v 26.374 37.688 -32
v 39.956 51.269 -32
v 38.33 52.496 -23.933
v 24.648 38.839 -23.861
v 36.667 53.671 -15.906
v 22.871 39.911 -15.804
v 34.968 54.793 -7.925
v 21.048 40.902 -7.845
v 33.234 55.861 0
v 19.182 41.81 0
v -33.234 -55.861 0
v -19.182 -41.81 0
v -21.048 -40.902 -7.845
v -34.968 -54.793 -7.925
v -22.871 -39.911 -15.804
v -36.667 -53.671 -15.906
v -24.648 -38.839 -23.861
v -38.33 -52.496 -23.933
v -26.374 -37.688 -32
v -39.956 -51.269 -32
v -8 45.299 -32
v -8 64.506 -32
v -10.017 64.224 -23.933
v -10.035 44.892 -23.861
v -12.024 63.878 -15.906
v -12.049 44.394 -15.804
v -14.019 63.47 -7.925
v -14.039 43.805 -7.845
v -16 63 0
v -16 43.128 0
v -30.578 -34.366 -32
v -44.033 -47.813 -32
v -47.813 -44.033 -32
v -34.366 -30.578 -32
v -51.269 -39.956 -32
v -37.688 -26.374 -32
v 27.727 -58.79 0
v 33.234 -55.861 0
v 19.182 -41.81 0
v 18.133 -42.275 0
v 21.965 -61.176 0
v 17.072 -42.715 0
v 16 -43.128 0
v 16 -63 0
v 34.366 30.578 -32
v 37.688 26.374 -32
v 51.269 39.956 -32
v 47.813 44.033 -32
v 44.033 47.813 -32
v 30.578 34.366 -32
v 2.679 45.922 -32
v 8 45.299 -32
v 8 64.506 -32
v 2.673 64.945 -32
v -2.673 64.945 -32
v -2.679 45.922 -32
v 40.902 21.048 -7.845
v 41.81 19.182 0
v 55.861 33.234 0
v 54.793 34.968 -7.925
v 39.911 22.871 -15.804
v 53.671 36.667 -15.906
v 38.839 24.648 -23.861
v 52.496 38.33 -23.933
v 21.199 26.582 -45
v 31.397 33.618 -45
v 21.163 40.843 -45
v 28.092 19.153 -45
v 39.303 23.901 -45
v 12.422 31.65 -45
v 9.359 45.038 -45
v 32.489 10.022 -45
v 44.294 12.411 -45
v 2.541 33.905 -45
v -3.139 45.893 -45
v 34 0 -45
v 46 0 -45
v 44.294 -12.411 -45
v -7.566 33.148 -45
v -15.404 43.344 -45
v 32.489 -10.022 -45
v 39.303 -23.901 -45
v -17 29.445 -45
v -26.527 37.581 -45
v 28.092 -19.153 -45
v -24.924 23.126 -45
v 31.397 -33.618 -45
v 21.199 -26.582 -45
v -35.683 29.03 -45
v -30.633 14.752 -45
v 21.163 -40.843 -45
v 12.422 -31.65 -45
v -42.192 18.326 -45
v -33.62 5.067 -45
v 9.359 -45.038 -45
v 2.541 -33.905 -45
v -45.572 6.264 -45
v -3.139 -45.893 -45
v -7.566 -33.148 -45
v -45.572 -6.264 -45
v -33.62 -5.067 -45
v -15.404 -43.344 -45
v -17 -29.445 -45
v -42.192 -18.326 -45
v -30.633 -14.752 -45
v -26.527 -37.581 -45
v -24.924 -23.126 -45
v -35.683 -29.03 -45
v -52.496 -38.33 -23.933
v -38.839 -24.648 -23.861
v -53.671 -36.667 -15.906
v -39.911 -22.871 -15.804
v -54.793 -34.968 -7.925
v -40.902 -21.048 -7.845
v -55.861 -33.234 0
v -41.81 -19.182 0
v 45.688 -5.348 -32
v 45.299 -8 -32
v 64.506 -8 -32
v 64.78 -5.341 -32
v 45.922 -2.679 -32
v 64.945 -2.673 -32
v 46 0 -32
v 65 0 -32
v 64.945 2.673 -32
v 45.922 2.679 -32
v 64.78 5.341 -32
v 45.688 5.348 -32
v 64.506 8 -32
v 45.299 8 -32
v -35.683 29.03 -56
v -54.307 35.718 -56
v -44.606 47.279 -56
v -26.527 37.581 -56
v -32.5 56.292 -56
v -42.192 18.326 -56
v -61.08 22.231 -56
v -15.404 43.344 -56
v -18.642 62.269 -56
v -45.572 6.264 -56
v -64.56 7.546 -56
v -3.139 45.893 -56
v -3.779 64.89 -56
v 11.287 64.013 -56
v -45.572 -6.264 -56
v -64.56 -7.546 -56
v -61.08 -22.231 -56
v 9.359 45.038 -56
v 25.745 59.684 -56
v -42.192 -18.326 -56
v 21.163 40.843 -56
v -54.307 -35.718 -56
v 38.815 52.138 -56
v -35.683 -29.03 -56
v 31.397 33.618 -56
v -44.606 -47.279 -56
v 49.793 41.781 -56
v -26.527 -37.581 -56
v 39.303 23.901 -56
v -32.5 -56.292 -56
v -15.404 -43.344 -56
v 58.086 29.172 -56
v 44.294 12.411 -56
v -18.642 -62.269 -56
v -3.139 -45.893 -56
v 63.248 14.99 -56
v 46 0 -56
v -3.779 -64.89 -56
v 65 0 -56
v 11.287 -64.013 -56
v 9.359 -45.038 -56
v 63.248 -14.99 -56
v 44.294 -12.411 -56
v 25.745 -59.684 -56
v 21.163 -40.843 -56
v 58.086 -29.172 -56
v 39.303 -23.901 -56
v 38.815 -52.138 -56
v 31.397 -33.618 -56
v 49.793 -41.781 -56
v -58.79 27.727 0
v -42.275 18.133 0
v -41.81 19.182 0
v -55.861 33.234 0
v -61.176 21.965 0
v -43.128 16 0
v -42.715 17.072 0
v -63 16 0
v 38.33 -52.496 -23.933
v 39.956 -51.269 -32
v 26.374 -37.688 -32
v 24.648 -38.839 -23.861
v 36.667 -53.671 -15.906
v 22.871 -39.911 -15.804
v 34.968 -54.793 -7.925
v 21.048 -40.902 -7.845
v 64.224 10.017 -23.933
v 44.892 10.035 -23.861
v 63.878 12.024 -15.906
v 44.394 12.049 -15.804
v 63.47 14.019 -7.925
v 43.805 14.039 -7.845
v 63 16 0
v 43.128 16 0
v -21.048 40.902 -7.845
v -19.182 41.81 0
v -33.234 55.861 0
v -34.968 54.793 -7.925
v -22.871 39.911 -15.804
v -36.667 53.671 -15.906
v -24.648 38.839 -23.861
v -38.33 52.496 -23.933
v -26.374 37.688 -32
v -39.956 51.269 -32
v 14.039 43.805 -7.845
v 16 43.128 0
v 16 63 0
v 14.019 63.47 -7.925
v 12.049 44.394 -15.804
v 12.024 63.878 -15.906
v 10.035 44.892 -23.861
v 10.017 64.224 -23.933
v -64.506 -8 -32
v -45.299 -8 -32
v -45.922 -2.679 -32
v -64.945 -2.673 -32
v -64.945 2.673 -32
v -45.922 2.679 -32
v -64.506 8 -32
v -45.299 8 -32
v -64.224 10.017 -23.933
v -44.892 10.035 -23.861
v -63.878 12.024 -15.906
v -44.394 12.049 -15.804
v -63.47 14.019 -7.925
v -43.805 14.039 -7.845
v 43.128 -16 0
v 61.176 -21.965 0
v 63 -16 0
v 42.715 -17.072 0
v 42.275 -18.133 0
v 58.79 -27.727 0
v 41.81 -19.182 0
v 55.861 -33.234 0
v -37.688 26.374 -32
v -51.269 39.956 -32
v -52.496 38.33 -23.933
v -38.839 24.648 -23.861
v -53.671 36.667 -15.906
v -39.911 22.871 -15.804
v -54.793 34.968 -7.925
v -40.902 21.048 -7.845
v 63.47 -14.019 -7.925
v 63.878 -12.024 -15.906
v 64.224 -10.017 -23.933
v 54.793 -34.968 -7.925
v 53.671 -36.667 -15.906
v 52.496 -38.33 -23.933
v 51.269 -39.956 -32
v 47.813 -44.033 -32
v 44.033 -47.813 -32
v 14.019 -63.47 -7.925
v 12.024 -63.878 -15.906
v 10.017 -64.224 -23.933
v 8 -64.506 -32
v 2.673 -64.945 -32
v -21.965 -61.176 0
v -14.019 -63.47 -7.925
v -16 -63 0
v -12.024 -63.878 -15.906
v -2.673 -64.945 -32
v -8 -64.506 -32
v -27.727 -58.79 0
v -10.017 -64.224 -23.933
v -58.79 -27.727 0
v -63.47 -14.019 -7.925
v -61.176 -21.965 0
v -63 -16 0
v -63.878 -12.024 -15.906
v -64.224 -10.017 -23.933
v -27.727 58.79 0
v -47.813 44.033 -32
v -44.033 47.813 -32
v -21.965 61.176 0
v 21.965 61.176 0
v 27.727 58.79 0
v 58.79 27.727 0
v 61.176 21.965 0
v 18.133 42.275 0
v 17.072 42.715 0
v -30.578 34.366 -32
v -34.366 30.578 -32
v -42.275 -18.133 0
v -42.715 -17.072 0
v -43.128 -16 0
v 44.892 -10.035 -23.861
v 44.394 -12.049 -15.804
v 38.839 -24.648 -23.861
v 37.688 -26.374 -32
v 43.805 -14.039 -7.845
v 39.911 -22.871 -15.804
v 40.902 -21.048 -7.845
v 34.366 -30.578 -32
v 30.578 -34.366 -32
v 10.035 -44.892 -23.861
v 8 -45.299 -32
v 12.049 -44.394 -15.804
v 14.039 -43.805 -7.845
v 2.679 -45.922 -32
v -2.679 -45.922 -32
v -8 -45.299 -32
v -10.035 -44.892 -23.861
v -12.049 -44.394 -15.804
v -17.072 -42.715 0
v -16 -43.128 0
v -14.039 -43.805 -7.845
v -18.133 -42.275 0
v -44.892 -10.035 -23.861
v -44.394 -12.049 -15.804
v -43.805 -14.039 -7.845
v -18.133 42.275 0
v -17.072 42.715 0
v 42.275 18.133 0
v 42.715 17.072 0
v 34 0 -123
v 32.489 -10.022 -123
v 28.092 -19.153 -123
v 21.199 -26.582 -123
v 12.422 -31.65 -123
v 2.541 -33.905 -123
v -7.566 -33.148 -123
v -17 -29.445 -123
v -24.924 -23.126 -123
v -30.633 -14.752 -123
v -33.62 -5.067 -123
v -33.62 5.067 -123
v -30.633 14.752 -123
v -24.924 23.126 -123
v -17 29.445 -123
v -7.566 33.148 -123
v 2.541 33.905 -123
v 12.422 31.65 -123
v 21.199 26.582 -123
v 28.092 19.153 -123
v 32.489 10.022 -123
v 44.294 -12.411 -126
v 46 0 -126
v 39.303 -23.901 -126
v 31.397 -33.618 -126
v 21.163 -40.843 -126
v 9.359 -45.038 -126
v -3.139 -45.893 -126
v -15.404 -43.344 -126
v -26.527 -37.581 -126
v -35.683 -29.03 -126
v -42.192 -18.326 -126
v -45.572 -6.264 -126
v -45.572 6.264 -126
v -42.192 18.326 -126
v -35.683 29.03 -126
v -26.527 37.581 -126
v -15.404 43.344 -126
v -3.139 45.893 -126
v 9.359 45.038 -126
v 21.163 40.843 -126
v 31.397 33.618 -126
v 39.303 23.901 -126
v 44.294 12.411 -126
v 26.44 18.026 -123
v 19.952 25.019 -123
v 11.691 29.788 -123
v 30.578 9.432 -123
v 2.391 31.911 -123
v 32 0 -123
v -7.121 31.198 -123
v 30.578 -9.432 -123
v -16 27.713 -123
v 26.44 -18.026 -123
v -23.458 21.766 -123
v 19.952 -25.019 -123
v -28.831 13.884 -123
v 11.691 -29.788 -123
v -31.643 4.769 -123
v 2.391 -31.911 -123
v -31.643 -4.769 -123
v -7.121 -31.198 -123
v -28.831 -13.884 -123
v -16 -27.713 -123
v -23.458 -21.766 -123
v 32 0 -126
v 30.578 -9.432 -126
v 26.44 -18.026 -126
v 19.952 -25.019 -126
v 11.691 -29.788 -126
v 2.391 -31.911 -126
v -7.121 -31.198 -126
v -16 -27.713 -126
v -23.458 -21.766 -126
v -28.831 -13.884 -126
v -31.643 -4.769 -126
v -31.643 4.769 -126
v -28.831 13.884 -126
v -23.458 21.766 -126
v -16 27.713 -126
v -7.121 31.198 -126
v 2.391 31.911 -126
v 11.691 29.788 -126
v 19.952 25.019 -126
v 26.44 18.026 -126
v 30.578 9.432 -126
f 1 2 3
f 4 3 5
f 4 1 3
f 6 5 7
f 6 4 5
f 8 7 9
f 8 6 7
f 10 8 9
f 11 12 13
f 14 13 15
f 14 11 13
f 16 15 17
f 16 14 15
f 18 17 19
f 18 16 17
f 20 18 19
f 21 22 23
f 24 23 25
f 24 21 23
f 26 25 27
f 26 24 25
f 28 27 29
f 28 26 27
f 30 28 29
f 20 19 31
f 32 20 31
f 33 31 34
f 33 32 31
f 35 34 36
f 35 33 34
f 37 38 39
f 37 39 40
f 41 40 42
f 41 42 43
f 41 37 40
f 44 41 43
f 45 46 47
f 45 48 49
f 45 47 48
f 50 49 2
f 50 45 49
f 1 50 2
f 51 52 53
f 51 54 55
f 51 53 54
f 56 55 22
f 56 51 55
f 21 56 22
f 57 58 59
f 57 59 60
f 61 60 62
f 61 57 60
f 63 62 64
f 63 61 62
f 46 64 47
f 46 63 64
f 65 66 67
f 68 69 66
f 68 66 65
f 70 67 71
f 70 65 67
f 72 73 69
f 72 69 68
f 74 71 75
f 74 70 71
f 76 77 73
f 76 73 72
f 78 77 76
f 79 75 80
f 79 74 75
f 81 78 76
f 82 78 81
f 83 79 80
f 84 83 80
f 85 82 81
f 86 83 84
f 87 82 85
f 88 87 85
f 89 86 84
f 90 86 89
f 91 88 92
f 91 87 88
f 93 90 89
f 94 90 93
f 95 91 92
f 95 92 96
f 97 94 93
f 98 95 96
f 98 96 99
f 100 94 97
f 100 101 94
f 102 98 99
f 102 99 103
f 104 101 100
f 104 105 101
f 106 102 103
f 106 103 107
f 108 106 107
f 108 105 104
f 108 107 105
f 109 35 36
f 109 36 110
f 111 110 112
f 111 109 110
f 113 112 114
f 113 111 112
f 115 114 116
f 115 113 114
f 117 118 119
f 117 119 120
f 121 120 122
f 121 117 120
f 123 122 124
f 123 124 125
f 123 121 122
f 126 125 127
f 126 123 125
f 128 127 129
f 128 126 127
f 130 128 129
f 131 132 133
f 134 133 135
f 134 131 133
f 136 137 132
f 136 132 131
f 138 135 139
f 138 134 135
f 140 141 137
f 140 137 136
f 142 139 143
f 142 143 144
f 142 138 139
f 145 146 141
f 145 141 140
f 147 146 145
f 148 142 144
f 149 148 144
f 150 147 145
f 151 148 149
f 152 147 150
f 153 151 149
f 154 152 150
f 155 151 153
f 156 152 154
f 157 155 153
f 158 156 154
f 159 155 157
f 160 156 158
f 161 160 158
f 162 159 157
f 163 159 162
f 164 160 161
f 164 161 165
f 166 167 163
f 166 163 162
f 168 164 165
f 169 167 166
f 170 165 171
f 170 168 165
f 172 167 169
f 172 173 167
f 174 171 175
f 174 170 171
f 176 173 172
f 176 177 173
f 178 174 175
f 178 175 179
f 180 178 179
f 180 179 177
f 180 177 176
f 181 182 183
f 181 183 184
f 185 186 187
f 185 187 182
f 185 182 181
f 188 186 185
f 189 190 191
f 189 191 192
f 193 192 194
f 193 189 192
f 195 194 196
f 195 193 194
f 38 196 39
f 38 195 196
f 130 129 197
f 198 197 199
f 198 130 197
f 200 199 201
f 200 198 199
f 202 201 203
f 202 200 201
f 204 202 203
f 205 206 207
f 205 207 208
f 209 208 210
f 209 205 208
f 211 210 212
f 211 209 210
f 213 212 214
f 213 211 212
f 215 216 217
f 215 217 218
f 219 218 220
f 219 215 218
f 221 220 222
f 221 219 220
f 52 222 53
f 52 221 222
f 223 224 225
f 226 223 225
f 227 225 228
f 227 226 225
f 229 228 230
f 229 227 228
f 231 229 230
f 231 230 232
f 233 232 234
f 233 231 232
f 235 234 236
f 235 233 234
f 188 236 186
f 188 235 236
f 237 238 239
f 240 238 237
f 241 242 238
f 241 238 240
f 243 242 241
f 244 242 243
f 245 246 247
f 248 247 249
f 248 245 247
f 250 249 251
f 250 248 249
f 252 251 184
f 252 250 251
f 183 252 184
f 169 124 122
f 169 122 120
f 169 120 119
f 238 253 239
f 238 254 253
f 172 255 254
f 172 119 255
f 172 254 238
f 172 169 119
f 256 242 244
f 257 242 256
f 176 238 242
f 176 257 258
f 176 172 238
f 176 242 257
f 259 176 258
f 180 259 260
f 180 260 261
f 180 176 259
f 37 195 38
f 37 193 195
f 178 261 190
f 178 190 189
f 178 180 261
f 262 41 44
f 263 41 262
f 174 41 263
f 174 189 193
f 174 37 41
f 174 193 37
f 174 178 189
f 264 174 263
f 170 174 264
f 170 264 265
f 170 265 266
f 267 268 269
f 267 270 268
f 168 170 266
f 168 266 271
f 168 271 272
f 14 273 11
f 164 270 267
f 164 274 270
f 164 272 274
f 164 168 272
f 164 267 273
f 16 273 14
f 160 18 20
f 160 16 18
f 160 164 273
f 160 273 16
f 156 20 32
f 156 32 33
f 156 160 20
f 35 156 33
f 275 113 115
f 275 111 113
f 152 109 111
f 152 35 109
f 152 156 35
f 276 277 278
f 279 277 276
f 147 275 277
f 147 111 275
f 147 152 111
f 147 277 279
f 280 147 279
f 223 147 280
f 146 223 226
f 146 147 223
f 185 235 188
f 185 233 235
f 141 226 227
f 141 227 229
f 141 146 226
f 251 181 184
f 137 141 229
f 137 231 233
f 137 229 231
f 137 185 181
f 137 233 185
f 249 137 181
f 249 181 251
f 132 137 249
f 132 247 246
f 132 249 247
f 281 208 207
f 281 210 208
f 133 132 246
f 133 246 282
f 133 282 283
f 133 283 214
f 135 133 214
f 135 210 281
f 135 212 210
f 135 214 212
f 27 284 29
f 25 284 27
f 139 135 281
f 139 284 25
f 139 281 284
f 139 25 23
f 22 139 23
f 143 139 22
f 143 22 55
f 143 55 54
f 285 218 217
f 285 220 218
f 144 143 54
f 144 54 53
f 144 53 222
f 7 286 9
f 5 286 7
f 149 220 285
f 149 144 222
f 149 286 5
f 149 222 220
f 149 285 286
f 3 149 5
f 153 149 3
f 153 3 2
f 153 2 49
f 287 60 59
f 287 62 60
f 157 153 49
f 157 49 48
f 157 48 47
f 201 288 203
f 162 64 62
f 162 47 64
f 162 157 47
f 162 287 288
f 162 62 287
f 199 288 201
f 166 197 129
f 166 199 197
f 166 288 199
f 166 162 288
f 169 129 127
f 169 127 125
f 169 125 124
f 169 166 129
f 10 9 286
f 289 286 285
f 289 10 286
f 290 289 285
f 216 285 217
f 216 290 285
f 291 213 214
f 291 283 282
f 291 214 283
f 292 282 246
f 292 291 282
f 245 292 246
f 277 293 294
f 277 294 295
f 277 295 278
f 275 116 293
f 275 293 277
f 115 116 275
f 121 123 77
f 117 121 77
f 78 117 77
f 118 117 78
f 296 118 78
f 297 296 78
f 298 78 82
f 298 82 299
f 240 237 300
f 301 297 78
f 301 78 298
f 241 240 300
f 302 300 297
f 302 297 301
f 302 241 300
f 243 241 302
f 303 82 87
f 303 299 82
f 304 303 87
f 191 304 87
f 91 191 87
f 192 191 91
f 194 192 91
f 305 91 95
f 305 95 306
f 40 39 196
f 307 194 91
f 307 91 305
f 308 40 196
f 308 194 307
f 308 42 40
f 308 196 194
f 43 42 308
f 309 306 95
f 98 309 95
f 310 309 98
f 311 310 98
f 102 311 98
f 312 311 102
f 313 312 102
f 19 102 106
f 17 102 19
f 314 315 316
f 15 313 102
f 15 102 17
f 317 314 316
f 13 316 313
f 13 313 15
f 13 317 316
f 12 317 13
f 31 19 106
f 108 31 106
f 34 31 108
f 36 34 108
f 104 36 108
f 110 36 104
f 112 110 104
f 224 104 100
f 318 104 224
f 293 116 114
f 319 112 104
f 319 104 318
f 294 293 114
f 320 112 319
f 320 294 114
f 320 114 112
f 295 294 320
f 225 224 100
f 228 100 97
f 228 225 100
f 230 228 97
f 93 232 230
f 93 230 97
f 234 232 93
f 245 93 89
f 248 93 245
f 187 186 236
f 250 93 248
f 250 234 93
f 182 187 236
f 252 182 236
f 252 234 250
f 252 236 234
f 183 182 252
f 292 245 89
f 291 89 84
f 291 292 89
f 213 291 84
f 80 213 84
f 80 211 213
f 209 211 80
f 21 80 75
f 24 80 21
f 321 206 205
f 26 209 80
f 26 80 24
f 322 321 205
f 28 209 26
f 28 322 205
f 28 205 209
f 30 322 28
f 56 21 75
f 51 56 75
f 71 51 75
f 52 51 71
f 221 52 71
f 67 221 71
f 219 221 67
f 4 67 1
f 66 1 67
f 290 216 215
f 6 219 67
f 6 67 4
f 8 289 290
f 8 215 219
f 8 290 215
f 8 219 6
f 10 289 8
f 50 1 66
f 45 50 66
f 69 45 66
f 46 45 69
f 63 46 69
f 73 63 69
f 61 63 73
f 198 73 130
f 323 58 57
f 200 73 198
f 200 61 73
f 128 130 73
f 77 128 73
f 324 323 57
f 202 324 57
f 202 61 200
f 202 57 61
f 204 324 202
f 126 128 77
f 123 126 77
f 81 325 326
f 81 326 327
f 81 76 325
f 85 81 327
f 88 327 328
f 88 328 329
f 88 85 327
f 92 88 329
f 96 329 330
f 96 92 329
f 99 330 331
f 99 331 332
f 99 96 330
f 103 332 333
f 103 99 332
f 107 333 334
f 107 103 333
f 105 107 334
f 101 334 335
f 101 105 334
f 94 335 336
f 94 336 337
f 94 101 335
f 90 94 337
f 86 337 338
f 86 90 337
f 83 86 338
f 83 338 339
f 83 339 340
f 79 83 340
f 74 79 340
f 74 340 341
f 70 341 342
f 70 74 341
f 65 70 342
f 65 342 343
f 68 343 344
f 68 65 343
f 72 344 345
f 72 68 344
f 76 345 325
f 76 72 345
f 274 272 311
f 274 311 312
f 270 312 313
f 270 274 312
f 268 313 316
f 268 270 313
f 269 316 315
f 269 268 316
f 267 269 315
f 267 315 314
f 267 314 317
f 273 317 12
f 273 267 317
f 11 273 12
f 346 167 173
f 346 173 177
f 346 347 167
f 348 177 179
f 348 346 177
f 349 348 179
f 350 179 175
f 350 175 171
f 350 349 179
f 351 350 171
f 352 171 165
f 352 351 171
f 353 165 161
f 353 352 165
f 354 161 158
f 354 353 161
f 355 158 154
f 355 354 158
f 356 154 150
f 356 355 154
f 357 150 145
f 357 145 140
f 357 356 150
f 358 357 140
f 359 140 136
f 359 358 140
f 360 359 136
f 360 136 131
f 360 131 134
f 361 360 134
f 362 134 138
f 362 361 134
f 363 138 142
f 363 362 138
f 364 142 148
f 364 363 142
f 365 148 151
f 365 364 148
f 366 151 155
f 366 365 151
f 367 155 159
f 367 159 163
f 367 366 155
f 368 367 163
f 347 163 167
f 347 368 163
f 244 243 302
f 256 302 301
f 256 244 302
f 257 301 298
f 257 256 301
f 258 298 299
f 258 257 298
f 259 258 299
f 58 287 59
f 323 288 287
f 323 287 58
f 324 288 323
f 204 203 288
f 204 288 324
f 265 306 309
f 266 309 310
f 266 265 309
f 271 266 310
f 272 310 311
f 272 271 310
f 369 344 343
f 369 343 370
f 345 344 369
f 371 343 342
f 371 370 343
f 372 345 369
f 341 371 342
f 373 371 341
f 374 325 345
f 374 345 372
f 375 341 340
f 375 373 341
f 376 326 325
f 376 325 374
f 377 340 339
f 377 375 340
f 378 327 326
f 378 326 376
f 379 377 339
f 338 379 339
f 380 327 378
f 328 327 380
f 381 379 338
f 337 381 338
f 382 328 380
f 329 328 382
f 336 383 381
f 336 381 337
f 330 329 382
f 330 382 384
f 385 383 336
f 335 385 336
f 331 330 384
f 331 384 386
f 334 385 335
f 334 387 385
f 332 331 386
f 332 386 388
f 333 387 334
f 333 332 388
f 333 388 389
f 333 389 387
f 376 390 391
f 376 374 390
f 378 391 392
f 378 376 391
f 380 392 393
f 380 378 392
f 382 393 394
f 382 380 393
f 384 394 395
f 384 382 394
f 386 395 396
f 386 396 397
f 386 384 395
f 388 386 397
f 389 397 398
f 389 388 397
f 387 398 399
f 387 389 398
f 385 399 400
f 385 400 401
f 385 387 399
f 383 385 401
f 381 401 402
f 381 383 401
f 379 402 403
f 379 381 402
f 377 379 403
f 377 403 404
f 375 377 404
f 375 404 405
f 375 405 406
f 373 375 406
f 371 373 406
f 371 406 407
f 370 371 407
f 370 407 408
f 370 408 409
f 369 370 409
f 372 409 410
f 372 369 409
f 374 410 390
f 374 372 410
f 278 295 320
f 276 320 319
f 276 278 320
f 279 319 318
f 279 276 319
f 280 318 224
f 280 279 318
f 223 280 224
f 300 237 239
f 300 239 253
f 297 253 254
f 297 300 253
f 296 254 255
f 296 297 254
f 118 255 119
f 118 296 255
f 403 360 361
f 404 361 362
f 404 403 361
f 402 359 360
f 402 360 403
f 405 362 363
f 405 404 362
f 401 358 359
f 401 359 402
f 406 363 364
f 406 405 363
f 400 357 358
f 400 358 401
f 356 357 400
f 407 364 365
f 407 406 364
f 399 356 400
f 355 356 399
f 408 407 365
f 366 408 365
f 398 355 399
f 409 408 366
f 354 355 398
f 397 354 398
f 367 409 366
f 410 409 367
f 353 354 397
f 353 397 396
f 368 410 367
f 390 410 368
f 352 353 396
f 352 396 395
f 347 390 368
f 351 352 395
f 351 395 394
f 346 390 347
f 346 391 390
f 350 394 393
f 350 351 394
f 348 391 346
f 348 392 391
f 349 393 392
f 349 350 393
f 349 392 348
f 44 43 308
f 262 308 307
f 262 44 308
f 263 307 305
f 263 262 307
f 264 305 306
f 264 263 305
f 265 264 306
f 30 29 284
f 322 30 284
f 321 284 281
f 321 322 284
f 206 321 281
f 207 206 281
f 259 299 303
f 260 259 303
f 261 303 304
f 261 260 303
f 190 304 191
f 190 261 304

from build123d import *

# Parameters (mm, degrees)
CUT_EXTRUDE_1_DEPTH      = 65
CUT_EXTRUDE_1_DEPTH_BACK = 65
CUT_EXTRUDE_2_DEPTH      = 65
CUT_EXTRUDE_2_DEPTH_BACK = 65
CUT_EXTRUDE_3_DEPTH      = 65
CUT_EXTRUDE_3_DEPTH_BACK = 65
CUT_EXTRUDE_4_DEPTH      = 65
CUT_EXTRUDE_4_DEPTH_BACK = 65


with BuildPart() as part:
    # Эскиз1 → Повернуть1 (revolve)
    with BuildSketch(Plane(origin=(0, 0, 0), x_dir=(0, 0, -1), z_dir=(1, 0, 0))):
        Polygon((0, 46), (0, 65), (56, 65), (56, 46), (126, 46), (126, 32), (123, 32), (123, 34), (45, 34), (45, 46), align=None)
    revolve(axis=Axis((0, 0, 0), (0, 0, -1)))

    # Эскиз2 → Вытянуть1 (cut, two sides: drawn at the far end of the back side and taken through both)
    with BuildSketch(Plane(origin=(0, 0, 0), x_dir=(0, 0, -1), z_dir=(1, 0, 0)).offset(-CUT_EXTRUDE_1_DEPTH_BACK)):
        Polygon((0, 16), (0, -16), (32, -8), (32, 8), align=None)
    extrude(amount=CUT_EXTRUDE_1_DEPTH + CUT_EXTRUDE_1_DEPTH_BACK, mode=Mode.SUBTRACT)

    # Эскиз3 → Вытянуть2 (cut, two sides: drawn at the far end of the back side and taken through both)
    with BuildSketch(Plane(origin=(0, 0, 0), x_dir=(1, 0, 0), z_dir=(0, 1, 0)).offset(-CUT_EXTRUDE_2_DEPTH_BACK)):
        Polygon((-16, 0), (16, 0), (8, 32), (-8, 32), align=None)
    extrude(amount=CUT_EXTRUDE_2_DEPTH + CUT_EXTRUDE_2_DEPTH_BACK, mode=Mode.SUBTRACT)

    # Эскиз4 → Вытянуть3 (cut, two sides: drawn at the far end of the back side and taken through both)
    with BuildSketch(Plane(origin=(0, 0, 0), x_dir=(-0.7071067811865476, -0.7071067811865475, 0), z_dir=(-0.7071067811865475, 0.7071067811865476, 0)).offset(-CUT_EXTRUDE_3_DEPTH_BACK)):
        Polygon((16, 0), (-16, 0), (-8, -32), (8, -32), align=None)
    extrude(amount=CUT_EXTRUDE_3_DEPTH + CUT_EXTRUDE_3_DEPTH_BACK, mode=Mode.SUBTRACT)

    # Эскиз5 → Вытянуть4 (cut, two sides: drawn at the far end of the back side and taken through both)
    with BuildSketch(Plane(origin=(0, 0, 0), x_dir=(0, 0, -1), z_dir=(0.7071067811865476, 0.7071067811865475, 0)).offset(-CUT_EXTRUDE_4_DEPTH_BACK)):
        Polygon((0, 16), (0, -16), (32, -8), (32, 8), align=None)
    extrude(amount=CUT_EXTRUDE_4_DEPTH + CUT_EXTRUDE_4_DEPTH_BACK, mode=Mode.SUBTRACT)


solid = part.part
